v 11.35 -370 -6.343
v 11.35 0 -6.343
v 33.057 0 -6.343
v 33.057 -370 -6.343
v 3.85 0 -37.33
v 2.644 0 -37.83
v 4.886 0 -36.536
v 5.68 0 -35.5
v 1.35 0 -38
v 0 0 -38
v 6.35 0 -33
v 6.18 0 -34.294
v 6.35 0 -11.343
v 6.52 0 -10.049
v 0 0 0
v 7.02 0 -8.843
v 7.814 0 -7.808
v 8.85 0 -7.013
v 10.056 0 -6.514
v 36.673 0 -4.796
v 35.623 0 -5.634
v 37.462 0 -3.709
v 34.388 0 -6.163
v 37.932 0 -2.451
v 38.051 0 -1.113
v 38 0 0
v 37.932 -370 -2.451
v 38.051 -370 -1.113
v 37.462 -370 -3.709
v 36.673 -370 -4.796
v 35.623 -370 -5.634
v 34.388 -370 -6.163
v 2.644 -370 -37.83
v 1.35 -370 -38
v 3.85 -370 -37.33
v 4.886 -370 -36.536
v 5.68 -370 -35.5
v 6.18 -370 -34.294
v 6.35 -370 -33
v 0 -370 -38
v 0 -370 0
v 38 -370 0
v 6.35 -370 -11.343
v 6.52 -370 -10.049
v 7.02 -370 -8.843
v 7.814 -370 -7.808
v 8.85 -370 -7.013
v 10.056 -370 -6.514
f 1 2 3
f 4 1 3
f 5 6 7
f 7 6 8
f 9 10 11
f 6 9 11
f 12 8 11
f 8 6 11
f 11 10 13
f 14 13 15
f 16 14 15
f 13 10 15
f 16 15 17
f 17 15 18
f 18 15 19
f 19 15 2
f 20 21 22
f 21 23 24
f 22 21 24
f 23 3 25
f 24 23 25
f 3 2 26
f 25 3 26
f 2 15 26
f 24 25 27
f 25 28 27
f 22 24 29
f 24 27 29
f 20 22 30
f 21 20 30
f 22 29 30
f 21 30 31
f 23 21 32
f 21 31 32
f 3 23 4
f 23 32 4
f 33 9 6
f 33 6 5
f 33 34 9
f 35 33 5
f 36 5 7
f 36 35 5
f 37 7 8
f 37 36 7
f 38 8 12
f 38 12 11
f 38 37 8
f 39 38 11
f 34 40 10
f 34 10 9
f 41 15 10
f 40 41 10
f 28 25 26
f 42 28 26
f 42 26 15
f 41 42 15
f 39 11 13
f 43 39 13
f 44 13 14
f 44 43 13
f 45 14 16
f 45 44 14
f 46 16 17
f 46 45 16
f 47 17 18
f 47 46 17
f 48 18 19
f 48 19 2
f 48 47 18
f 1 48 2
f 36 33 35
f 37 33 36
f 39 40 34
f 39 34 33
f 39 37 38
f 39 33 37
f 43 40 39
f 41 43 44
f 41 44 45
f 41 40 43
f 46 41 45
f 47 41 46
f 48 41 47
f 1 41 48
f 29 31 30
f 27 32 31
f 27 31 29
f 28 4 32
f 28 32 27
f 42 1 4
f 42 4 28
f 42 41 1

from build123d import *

# Parameters (mm, degrees)
F1_DEPTH = 370
F2_R     = 5
F3_R     = 5


with BuildPart() as f1:
    # F0 (on Front) → F1 (new body)
    with BuildSketch(Plane.XZ):
        Polygon((38, 0), (0, 0), (0, -38), (6.35, -38), (6.35, -6.343249), (38.292737, -6.343249), align=None)
    extrude(amount=F1_DEPTH)

    # F2
    f2_edges = [f1.edges().sort_by_distance(p)[0] for p in [
        (6.35, -185, -38),
        (6.35, -185, -6.343249),
    ]]
    fillet(f2_edges, radius=F2_R)

    # F3
    f3_edges = [f1.edges().sort_by_distance(p)[0] for p in [
        (38.292737, -185, -6.343249),
    ]]
    fillet(f3_edges, radius=F3_R)


solid = f1.part
